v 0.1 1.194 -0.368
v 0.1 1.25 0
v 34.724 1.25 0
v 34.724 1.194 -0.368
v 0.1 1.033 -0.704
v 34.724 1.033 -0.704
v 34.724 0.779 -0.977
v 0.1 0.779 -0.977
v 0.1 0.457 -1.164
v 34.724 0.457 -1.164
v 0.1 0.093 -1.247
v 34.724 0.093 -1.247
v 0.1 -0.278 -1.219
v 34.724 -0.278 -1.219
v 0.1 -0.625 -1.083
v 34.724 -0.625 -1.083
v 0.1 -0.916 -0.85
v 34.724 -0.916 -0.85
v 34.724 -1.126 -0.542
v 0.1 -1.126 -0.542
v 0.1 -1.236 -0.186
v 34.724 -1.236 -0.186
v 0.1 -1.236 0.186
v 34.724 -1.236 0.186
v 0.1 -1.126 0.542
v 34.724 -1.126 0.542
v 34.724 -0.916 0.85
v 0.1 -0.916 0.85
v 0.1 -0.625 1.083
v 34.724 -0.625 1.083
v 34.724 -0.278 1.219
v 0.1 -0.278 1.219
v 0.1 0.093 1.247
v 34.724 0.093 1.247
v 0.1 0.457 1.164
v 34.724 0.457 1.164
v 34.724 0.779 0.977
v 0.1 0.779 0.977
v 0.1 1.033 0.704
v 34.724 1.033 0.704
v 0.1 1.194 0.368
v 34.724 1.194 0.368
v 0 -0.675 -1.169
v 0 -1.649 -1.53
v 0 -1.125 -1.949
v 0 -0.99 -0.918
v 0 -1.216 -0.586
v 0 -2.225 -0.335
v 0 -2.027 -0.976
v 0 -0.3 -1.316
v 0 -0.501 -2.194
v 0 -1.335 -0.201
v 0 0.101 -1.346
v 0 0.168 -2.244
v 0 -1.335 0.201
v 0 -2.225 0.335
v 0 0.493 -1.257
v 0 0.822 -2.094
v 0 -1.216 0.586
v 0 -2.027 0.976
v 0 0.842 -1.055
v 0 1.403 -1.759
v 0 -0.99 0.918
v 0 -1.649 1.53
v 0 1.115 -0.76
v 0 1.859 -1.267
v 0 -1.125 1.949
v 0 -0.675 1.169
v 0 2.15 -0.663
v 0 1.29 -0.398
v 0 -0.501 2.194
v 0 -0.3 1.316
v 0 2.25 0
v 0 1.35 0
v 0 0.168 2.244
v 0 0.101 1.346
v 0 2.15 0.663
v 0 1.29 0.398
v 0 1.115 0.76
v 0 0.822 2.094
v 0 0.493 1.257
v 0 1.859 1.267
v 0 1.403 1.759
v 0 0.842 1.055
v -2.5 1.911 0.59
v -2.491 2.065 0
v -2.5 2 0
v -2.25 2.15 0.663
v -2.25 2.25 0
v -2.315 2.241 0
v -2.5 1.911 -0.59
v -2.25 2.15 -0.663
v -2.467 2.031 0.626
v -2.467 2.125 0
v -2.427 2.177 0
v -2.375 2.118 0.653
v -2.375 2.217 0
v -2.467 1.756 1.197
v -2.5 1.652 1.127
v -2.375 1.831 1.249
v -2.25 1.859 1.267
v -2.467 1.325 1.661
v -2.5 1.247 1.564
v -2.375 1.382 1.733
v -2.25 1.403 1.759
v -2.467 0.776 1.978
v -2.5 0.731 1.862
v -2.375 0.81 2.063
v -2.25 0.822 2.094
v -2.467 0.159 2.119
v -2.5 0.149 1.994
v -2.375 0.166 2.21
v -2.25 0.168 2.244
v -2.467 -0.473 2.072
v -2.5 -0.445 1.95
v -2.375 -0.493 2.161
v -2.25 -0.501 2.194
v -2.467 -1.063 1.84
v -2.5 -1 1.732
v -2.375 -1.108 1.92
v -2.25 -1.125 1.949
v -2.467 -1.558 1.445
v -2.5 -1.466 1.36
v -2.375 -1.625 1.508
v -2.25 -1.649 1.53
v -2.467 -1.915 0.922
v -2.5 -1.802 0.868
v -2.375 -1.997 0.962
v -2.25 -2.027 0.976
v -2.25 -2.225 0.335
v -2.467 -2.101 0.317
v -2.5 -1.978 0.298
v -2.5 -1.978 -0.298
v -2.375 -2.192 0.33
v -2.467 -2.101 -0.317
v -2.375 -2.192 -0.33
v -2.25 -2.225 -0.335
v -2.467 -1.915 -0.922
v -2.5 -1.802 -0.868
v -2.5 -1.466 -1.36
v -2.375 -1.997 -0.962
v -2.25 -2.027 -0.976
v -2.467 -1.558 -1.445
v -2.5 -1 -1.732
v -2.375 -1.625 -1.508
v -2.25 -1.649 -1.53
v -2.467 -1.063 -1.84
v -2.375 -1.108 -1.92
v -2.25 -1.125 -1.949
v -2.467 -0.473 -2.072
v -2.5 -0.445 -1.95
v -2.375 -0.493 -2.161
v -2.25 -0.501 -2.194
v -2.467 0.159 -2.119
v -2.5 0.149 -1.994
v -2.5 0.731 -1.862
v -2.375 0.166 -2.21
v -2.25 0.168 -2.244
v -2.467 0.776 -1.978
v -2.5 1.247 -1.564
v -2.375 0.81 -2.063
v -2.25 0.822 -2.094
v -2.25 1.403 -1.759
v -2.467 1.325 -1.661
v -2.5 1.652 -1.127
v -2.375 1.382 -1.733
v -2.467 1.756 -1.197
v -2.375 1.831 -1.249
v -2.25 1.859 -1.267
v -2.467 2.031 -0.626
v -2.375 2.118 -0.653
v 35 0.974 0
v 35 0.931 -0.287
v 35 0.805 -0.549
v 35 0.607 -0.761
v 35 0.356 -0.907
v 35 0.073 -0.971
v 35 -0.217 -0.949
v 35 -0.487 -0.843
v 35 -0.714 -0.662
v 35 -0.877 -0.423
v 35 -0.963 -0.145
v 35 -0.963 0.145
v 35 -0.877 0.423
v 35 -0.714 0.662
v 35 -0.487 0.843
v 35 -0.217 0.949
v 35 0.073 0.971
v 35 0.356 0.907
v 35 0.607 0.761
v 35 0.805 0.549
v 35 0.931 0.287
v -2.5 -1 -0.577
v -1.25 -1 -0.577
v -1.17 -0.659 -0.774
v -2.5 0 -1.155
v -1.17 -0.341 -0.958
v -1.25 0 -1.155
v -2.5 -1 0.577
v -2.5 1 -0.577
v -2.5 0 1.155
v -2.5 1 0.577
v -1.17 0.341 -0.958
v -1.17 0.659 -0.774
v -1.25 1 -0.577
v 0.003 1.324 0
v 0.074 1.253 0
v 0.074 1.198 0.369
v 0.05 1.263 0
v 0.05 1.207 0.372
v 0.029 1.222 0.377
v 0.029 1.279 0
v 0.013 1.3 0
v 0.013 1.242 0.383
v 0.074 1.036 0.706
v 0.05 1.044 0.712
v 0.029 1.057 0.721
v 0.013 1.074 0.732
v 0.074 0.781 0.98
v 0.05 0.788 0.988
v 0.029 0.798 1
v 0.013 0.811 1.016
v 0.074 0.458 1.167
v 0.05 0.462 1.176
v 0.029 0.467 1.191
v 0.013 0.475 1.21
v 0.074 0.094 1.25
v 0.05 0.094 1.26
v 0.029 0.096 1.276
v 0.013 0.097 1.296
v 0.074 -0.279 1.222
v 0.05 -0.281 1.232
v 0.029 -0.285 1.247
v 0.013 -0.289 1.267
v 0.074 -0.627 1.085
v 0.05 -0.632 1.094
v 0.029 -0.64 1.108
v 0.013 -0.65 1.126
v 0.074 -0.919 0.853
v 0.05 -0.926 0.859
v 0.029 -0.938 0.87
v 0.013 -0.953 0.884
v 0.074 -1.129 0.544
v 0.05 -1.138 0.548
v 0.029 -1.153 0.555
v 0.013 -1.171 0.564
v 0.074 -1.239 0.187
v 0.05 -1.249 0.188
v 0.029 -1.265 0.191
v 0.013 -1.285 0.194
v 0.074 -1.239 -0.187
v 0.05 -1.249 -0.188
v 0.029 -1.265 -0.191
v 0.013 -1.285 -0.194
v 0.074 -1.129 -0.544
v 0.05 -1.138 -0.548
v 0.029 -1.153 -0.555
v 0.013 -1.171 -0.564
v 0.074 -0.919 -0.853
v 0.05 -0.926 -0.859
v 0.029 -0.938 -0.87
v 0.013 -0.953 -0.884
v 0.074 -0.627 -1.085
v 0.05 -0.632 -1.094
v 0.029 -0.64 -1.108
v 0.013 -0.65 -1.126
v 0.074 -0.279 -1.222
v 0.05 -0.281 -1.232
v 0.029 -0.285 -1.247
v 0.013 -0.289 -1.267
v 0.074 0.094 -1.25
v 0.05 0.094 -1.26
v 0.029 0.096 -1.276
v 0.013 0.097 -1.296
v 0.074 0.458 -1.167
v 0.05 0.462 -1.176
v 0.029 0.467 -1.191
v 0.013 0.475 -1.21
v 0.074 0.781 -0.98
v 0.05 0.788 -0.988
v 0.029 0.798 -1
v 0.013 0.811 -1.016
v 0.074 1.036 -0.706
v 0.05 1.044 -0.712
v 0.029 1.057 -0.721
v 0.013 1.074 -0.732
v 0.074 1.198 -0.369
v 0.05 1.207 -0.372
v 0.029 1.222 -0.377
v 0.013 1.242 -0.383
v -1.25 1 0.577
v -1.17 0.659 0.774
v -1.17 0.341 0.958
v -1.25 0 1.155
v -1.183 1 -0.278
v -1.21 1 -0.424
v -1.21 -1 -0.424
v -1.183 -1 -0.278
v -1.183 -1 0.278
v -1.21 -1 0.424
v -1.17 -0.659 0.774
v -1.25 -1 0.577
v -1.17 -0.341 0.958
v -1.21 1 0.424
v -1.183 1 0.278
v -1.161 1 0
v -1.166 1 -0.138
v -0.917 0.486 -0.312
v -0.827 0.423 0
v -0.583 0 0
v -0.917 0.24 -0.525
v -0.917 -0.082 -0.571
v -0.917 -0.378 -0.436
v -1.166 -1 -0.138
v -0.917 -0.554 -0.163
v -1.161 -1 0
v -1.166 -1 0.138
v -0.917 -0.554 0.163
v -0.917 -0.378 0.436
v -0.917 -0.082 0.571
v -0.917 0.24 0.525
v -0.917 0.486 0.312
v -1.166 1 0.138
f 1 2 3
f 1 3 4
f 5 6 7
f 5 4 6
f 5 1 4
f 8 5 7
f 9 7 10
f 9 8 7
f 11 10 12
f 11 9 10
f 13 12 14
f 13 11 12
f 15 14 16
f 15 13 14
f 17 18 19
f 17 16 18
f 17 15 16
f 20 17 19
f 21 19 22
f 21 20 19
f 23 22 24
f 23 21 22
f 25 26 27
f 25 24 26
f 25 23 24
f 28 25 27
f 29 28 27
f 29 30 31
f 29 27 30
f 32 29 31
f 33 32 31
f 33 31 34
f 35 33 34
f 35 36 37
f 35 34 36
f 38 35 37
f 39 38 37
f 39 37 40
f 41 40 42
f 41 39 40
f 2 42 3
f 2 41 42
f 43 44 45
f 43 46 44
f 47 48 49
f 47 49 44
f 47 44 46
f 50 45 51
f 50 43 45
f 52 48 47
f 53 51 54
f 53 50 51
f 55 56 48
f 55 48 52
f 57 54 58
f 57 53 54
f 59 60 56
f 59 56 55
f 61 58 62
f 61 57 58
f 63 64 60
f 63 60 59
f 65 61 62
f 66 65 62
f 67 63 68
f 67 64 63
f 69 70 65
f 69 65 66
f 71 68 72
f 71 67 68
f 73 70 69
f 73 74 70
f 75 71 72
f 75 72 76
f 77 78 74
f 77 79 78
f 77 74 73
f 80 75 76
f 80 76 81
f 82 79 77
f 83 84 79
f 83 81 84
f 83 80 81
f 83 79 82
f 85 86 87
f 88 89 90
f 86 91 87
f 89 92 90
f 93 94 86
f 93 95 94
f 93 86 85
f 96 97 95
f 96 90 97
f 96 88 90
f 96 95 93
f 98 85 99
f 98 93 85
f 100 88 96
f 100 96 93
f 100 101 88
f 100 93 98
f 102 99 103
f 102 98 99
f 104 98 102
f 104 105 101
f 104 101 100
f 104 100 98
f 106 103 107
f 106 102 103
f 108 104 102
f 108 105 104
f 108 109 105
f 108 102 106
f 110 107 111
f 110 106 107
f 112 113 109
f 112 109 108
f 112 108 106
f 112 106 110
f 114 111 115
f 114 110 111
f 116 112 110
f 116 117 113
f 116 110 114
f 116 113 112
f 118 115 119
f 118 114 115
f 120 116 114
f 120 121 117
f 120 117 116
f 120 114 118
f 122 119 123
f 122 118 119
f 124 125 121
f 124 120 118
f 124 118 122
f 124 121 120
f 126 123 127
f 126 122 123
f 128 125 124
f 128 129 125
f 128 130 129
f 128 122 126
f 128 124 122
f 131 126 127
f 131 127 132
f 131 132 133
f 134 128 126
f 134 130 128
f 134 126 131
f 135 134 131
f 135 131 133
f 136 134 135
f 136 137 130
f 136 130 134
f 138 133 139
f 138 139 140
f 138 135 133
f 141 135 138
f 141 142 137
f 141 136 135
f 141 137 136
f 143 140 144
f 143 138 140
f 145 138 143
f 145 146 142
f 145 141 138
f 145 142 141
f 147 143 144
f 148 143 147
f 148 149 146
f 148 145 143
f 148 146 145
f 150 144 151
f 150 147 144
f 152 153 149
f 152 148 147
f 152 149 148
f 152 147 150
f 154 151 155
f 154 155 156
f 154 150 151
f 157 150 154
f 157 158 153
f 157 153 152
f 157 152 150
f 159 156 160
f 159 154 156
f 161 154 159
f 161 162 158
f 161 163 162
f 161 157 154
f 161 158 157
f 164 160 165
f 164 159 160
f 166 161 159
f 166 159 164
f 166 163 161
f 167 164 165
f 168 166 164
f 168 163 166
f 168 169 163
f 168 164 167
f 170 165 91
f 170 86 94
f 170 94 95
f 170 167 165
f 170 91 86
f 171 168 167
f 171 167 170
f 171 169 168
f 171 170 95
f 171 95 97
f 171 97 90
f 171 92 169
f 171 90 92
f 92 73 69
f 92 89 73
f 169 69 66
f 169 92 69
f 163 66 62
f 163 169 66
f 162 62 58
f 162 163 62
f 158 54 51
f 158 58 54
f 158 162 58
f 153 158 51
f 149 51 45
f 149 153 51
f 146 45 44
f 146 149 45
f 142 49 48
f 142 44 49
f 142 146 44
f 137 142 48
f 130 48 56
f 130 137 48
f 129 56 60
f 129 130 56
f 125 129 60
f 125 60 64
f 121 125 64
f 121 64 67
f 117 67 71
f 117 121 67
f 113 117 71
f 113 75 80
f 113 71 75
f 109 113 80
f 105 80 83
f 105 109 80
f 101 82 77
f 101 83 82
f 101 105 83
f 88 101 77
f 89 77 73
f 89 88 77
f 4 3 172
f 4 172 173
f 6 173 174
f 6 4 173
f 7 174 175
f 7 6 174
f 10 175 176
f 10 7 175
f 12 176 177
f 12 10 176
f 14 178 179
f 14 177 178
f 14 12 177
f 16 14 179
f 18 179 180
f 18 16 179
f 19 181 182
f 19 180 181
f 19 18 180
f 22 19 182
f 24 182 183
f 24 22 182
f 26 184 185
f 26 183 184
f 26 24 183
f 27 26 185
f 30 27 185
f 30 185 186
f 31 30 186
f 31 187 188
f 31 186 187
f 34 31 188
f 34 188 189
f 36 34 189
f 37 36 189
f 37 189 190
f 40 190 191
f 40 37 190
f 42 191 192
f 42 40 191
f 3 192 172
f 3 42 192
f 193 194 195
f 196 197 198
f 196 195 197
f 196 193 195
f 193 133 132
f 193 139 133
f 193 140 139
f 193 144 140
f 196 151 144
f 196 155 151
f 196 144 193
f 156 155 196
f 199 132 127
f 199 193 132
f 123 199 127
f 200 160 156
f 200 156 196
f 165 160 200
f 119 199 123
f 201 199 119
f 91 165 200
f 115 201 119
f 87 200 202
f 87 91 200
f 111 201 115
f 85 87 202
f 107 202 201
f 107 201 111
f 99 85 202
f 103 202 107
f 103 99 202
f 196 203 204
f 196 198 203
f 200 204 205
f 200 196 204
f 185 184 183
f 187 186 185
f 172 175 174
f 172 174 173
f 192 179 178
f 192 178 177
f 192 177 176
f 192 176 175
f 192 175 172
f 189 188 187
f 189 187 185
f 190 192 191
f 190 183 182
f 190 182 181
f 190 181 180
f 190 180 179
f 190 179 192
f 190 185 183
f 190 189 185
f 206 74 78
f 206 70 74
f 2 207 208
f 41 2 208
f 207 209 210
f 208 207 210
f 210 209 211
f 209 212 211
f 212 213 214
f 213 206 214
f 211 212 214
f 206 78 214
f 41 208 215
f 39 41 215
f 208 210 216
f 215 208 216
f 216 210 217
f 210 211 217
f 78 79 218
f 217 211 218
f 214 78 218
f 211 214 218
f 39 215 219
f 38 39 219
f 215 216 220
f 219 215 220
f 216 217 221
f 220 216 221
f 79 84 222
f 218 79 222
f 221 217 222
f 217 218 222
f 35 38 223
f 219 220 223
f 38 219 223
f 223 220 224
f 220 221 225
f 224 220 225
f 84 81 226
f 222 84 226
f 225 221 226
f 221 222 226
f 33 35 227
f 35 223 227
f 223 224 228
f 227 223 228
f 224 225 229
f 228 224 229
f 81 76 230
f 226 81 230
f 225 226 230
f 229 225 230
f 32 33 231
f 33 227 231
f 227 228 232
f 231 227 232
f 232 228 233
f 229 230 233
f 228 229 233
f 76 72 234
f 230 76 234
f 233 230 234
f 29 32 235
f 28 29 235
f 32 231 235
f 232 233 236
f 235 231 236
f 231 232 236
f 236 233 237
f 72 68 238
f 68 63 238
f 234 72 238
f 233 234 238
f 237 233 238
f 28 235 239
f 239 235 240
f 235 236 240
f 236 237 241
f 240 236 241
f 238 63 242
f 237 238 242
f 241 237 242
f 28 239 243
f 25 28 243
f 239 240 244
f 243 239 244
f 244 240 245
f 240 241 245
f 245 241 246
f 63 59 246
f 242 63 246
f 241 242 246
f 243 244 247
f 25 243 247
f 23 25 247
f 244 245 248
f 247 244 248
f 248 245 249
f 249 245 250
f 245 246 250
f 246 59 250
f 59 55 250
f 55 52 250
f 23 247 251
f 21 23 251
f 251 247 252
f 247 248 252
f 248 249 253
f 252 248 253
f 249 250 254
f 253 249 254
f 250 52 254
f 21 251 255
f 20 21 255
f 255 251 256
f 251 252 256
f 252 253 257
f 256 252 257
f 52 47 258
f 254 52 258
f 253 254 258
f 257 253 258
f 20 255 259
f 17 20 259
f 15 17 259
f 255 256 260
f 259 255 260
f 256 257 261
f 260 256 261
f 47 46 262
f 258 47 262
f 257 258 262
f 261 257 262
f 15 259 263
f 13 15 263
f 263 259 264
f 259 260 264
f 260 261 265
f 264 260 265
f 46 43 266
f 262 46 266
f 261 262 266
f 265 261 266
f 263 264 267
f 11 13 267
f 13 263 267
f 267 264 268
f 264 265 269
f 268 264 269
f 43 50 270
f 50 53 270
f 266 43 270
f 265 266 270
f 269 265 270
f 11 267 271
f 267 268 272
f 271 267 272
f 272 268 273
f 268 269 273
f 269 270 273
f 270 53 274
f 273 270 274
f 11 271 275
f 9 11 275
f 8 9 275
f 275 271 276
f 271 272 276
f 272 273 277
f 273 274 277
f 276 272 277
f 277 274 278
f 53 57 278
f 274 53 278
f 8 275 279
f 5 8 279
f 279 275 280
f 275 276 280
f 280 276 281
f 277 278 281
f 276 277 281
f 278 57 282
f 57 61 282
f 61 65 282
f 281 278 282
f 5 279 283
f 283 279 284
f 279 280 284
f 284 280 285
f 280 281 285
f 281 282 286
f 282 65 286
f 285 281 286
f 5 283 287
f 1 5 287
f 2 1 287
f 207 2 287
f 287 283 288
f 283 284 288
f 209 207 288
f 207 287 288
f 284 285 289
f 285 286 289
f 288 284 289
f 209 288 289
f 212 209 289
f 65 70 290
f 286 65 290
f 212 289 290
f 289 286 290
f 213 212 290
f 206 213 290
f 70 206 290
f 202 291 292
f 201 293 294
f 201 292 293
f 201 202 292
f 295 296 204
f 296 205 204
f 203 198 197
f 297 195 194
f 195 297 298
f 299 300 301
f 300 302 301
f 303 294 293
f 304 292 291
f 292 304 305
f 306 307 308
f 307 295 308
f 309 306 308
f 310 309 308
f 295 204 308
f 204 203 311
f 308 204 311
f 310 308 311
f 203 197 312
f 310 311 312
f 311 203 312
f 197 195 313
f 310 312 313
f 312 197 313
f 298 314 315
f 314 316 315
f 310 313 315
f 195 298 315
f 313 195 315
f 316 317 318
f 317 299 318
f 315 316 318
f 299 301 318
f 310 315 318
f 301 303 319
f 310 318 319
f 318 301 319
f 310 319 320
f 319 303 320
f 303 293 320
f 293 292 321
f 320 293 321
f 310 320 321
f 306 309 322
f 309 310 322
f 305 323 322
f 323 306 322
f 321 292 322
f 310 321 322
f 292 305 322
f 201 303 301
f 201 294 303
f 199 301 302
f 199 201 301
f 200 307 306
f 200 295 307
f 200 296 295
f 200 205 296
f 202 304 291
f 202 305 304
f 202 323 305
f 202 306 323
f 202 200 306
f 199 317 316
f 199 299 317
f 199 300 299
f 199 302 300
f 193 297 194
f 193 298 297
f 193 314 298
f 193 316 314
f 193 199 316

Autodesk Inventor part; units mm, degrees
ref_plane "YZ Plane" through (0, 0, 0) normal (1, 0, 0) x (0, 1, 0)
ref_plane "XZ Plane" through (0, 0, 0) normal (0, 1, 0) x (-1, 0, 0)
sketch "Sketch1" plane through (0, 0, 0) normal (0, 0, 1) x (1, 0, 0)
  line L0 (-0.5833, 0) -> (35, 0)
  line L1 (35, 0) -> (35, 1.25)
  line L2 (35, 1.25) -> (18, 1.25)
  line L3 (18, 1.25) -> (17.7239, 1.25)
  line L4 (17.7239, 1.25) -> (0, 1.25)
  line L5 (0, 1.25) -> (0, 2.25)
  line L6 (0, 2.25) -> (-2.5, 2.25)
  line L7 (-2.5, 2.25) -> (-2.5, 1.1547)
  line L8 (-2.5, 1.1547) -> (-1.25, 1.1547)
  line L9 (-1.25, 1.1547) -> (-0.5833, 0)
  line L10 (-10, 0) -> (42.5, 0) projected
  line L11 (0, -0.45) -> (0, 2.7) projected
  line L12 (18, 1.25) -> (0, 1.25) construction
  dimension "d0" = 17
  dimension "d1" = 0.2761
  dimension "d2" = 2.5
  dimension "d3" = 1.25
  dimension "d4" = 60
  dimension "d5" = 2.5
  dimension "d6" = 2.5
  dimension "d7" = 2.3094
  dimension "d8" = 4.5
  dimension "d19" = 35
revolve "Body" add sketch "Sketch1" angle 360 about axis through (-0.5833, 0, 0) along (1, 0, 0)
sketch "Sketch2" plane through (-2.5, 0, 0) normal (-1, 0, 0) x (0, 0, 1)
  circle A0 centre (0, 0) radius 1.1547 projected
  line L0 (0, -3.15) -> (0, 3.15) projected
  line L1 (-3.15, 0) -> (3.15, 0) projected
  line L2 (1.1547, 0) -> (0.5774, -1)
  line L3 (0.5774, -1) -> (-0.5774, -1)
  line L4 (-0.5774, -1) -> (-1.1547, 0)
  line L5 (-1.1547, 0) -> (-0.5774, 1)
  line L6 (-0.5774, 1) -> (0.5774, 1)
  line L7 (0.5774, 1) -> (1.1547, 0)
extrude "Slot" add sketch "Sketch2" against normal up to next contours L7 A0 | A0 L2 | L6 L0 A0 | A0 L0 L3 | L0 L6 A0 | A0 L3 L0 | L4 A0 | A0 L5
fillet "Fillet2" radius 0.25 1 edges at (-2.5, -2.25, 0)
thread "Thread" size "M2.5x0.45" class "6g" standard "ISO Metric profile" length 17
chamfer "Chamfer1" distance 0.2761 distance2 0.2761 1 edges at (35, -1.25, 0) measured on face at (35, -0.9652, -0.0666)
fillet "Fillet1" radius 0.1 1 edges at (0, -1.25, 0)
ref_plane "Work Plane1" through (30, 0, 0) normal (0, -0.5, 0.866) x (1, 0, 0)
equation "\"d0\" = GEL"
equation "\"d1\" = GAL"
equation "\"d2\" = KOH"
equation "\"d3\" = INTI"
equation "\"d5\" = GD"
equation "\"d6\" = BDM"
equation "\"d7\" = 1.1547 * SW"
equation "\"d8\" = KOD"
equation "\"d19\" = NLG"
equation "\"d16\" = RR"
equation "\"d12\" = GEL"
equation "\"d14\" = -0.5 * SPD + 0.5 * GD"
equation "\"d15\" = GUL"
equation "\"d29\" = R"
equation "\"GD\" = NND"
equation "\"NLG\" = 35"
equation "\"GEL\" = 17"
equation "\"KOD\" = 4.5"
equation "\"KOH\" = 2.5"
equation "\"INTI\" = 1.25"
equation "\"GAL\" = 0.61345 * PTC"
equation "\"GUL\" = 0.61345 * PTC"
equation "\"BDM\" = NND"
equation "\"SW\" = 2"
equation "\"RR\" = 0.25"
equation "\"SPD\" = 1.94789"
equation "\"d28\" = R"
equation "\"R\" = 0.1"
equation "\"TOA\" = 30deg"
equation "\"THREADDIA\" = 2.5"
equation "\"KOD1\" = KOD"
equation "\"PTC\" = 0.45"
equation "\"NND\" = 2.5"
equation "\"E0\" = 1.155 * SW"
equation "\"GD1\" = THREADDIA - 1.2269 * PTC"
properties part number "ANSI B18.3.1M - M2,5x0,45 x 35" material "Steel, Mild"
